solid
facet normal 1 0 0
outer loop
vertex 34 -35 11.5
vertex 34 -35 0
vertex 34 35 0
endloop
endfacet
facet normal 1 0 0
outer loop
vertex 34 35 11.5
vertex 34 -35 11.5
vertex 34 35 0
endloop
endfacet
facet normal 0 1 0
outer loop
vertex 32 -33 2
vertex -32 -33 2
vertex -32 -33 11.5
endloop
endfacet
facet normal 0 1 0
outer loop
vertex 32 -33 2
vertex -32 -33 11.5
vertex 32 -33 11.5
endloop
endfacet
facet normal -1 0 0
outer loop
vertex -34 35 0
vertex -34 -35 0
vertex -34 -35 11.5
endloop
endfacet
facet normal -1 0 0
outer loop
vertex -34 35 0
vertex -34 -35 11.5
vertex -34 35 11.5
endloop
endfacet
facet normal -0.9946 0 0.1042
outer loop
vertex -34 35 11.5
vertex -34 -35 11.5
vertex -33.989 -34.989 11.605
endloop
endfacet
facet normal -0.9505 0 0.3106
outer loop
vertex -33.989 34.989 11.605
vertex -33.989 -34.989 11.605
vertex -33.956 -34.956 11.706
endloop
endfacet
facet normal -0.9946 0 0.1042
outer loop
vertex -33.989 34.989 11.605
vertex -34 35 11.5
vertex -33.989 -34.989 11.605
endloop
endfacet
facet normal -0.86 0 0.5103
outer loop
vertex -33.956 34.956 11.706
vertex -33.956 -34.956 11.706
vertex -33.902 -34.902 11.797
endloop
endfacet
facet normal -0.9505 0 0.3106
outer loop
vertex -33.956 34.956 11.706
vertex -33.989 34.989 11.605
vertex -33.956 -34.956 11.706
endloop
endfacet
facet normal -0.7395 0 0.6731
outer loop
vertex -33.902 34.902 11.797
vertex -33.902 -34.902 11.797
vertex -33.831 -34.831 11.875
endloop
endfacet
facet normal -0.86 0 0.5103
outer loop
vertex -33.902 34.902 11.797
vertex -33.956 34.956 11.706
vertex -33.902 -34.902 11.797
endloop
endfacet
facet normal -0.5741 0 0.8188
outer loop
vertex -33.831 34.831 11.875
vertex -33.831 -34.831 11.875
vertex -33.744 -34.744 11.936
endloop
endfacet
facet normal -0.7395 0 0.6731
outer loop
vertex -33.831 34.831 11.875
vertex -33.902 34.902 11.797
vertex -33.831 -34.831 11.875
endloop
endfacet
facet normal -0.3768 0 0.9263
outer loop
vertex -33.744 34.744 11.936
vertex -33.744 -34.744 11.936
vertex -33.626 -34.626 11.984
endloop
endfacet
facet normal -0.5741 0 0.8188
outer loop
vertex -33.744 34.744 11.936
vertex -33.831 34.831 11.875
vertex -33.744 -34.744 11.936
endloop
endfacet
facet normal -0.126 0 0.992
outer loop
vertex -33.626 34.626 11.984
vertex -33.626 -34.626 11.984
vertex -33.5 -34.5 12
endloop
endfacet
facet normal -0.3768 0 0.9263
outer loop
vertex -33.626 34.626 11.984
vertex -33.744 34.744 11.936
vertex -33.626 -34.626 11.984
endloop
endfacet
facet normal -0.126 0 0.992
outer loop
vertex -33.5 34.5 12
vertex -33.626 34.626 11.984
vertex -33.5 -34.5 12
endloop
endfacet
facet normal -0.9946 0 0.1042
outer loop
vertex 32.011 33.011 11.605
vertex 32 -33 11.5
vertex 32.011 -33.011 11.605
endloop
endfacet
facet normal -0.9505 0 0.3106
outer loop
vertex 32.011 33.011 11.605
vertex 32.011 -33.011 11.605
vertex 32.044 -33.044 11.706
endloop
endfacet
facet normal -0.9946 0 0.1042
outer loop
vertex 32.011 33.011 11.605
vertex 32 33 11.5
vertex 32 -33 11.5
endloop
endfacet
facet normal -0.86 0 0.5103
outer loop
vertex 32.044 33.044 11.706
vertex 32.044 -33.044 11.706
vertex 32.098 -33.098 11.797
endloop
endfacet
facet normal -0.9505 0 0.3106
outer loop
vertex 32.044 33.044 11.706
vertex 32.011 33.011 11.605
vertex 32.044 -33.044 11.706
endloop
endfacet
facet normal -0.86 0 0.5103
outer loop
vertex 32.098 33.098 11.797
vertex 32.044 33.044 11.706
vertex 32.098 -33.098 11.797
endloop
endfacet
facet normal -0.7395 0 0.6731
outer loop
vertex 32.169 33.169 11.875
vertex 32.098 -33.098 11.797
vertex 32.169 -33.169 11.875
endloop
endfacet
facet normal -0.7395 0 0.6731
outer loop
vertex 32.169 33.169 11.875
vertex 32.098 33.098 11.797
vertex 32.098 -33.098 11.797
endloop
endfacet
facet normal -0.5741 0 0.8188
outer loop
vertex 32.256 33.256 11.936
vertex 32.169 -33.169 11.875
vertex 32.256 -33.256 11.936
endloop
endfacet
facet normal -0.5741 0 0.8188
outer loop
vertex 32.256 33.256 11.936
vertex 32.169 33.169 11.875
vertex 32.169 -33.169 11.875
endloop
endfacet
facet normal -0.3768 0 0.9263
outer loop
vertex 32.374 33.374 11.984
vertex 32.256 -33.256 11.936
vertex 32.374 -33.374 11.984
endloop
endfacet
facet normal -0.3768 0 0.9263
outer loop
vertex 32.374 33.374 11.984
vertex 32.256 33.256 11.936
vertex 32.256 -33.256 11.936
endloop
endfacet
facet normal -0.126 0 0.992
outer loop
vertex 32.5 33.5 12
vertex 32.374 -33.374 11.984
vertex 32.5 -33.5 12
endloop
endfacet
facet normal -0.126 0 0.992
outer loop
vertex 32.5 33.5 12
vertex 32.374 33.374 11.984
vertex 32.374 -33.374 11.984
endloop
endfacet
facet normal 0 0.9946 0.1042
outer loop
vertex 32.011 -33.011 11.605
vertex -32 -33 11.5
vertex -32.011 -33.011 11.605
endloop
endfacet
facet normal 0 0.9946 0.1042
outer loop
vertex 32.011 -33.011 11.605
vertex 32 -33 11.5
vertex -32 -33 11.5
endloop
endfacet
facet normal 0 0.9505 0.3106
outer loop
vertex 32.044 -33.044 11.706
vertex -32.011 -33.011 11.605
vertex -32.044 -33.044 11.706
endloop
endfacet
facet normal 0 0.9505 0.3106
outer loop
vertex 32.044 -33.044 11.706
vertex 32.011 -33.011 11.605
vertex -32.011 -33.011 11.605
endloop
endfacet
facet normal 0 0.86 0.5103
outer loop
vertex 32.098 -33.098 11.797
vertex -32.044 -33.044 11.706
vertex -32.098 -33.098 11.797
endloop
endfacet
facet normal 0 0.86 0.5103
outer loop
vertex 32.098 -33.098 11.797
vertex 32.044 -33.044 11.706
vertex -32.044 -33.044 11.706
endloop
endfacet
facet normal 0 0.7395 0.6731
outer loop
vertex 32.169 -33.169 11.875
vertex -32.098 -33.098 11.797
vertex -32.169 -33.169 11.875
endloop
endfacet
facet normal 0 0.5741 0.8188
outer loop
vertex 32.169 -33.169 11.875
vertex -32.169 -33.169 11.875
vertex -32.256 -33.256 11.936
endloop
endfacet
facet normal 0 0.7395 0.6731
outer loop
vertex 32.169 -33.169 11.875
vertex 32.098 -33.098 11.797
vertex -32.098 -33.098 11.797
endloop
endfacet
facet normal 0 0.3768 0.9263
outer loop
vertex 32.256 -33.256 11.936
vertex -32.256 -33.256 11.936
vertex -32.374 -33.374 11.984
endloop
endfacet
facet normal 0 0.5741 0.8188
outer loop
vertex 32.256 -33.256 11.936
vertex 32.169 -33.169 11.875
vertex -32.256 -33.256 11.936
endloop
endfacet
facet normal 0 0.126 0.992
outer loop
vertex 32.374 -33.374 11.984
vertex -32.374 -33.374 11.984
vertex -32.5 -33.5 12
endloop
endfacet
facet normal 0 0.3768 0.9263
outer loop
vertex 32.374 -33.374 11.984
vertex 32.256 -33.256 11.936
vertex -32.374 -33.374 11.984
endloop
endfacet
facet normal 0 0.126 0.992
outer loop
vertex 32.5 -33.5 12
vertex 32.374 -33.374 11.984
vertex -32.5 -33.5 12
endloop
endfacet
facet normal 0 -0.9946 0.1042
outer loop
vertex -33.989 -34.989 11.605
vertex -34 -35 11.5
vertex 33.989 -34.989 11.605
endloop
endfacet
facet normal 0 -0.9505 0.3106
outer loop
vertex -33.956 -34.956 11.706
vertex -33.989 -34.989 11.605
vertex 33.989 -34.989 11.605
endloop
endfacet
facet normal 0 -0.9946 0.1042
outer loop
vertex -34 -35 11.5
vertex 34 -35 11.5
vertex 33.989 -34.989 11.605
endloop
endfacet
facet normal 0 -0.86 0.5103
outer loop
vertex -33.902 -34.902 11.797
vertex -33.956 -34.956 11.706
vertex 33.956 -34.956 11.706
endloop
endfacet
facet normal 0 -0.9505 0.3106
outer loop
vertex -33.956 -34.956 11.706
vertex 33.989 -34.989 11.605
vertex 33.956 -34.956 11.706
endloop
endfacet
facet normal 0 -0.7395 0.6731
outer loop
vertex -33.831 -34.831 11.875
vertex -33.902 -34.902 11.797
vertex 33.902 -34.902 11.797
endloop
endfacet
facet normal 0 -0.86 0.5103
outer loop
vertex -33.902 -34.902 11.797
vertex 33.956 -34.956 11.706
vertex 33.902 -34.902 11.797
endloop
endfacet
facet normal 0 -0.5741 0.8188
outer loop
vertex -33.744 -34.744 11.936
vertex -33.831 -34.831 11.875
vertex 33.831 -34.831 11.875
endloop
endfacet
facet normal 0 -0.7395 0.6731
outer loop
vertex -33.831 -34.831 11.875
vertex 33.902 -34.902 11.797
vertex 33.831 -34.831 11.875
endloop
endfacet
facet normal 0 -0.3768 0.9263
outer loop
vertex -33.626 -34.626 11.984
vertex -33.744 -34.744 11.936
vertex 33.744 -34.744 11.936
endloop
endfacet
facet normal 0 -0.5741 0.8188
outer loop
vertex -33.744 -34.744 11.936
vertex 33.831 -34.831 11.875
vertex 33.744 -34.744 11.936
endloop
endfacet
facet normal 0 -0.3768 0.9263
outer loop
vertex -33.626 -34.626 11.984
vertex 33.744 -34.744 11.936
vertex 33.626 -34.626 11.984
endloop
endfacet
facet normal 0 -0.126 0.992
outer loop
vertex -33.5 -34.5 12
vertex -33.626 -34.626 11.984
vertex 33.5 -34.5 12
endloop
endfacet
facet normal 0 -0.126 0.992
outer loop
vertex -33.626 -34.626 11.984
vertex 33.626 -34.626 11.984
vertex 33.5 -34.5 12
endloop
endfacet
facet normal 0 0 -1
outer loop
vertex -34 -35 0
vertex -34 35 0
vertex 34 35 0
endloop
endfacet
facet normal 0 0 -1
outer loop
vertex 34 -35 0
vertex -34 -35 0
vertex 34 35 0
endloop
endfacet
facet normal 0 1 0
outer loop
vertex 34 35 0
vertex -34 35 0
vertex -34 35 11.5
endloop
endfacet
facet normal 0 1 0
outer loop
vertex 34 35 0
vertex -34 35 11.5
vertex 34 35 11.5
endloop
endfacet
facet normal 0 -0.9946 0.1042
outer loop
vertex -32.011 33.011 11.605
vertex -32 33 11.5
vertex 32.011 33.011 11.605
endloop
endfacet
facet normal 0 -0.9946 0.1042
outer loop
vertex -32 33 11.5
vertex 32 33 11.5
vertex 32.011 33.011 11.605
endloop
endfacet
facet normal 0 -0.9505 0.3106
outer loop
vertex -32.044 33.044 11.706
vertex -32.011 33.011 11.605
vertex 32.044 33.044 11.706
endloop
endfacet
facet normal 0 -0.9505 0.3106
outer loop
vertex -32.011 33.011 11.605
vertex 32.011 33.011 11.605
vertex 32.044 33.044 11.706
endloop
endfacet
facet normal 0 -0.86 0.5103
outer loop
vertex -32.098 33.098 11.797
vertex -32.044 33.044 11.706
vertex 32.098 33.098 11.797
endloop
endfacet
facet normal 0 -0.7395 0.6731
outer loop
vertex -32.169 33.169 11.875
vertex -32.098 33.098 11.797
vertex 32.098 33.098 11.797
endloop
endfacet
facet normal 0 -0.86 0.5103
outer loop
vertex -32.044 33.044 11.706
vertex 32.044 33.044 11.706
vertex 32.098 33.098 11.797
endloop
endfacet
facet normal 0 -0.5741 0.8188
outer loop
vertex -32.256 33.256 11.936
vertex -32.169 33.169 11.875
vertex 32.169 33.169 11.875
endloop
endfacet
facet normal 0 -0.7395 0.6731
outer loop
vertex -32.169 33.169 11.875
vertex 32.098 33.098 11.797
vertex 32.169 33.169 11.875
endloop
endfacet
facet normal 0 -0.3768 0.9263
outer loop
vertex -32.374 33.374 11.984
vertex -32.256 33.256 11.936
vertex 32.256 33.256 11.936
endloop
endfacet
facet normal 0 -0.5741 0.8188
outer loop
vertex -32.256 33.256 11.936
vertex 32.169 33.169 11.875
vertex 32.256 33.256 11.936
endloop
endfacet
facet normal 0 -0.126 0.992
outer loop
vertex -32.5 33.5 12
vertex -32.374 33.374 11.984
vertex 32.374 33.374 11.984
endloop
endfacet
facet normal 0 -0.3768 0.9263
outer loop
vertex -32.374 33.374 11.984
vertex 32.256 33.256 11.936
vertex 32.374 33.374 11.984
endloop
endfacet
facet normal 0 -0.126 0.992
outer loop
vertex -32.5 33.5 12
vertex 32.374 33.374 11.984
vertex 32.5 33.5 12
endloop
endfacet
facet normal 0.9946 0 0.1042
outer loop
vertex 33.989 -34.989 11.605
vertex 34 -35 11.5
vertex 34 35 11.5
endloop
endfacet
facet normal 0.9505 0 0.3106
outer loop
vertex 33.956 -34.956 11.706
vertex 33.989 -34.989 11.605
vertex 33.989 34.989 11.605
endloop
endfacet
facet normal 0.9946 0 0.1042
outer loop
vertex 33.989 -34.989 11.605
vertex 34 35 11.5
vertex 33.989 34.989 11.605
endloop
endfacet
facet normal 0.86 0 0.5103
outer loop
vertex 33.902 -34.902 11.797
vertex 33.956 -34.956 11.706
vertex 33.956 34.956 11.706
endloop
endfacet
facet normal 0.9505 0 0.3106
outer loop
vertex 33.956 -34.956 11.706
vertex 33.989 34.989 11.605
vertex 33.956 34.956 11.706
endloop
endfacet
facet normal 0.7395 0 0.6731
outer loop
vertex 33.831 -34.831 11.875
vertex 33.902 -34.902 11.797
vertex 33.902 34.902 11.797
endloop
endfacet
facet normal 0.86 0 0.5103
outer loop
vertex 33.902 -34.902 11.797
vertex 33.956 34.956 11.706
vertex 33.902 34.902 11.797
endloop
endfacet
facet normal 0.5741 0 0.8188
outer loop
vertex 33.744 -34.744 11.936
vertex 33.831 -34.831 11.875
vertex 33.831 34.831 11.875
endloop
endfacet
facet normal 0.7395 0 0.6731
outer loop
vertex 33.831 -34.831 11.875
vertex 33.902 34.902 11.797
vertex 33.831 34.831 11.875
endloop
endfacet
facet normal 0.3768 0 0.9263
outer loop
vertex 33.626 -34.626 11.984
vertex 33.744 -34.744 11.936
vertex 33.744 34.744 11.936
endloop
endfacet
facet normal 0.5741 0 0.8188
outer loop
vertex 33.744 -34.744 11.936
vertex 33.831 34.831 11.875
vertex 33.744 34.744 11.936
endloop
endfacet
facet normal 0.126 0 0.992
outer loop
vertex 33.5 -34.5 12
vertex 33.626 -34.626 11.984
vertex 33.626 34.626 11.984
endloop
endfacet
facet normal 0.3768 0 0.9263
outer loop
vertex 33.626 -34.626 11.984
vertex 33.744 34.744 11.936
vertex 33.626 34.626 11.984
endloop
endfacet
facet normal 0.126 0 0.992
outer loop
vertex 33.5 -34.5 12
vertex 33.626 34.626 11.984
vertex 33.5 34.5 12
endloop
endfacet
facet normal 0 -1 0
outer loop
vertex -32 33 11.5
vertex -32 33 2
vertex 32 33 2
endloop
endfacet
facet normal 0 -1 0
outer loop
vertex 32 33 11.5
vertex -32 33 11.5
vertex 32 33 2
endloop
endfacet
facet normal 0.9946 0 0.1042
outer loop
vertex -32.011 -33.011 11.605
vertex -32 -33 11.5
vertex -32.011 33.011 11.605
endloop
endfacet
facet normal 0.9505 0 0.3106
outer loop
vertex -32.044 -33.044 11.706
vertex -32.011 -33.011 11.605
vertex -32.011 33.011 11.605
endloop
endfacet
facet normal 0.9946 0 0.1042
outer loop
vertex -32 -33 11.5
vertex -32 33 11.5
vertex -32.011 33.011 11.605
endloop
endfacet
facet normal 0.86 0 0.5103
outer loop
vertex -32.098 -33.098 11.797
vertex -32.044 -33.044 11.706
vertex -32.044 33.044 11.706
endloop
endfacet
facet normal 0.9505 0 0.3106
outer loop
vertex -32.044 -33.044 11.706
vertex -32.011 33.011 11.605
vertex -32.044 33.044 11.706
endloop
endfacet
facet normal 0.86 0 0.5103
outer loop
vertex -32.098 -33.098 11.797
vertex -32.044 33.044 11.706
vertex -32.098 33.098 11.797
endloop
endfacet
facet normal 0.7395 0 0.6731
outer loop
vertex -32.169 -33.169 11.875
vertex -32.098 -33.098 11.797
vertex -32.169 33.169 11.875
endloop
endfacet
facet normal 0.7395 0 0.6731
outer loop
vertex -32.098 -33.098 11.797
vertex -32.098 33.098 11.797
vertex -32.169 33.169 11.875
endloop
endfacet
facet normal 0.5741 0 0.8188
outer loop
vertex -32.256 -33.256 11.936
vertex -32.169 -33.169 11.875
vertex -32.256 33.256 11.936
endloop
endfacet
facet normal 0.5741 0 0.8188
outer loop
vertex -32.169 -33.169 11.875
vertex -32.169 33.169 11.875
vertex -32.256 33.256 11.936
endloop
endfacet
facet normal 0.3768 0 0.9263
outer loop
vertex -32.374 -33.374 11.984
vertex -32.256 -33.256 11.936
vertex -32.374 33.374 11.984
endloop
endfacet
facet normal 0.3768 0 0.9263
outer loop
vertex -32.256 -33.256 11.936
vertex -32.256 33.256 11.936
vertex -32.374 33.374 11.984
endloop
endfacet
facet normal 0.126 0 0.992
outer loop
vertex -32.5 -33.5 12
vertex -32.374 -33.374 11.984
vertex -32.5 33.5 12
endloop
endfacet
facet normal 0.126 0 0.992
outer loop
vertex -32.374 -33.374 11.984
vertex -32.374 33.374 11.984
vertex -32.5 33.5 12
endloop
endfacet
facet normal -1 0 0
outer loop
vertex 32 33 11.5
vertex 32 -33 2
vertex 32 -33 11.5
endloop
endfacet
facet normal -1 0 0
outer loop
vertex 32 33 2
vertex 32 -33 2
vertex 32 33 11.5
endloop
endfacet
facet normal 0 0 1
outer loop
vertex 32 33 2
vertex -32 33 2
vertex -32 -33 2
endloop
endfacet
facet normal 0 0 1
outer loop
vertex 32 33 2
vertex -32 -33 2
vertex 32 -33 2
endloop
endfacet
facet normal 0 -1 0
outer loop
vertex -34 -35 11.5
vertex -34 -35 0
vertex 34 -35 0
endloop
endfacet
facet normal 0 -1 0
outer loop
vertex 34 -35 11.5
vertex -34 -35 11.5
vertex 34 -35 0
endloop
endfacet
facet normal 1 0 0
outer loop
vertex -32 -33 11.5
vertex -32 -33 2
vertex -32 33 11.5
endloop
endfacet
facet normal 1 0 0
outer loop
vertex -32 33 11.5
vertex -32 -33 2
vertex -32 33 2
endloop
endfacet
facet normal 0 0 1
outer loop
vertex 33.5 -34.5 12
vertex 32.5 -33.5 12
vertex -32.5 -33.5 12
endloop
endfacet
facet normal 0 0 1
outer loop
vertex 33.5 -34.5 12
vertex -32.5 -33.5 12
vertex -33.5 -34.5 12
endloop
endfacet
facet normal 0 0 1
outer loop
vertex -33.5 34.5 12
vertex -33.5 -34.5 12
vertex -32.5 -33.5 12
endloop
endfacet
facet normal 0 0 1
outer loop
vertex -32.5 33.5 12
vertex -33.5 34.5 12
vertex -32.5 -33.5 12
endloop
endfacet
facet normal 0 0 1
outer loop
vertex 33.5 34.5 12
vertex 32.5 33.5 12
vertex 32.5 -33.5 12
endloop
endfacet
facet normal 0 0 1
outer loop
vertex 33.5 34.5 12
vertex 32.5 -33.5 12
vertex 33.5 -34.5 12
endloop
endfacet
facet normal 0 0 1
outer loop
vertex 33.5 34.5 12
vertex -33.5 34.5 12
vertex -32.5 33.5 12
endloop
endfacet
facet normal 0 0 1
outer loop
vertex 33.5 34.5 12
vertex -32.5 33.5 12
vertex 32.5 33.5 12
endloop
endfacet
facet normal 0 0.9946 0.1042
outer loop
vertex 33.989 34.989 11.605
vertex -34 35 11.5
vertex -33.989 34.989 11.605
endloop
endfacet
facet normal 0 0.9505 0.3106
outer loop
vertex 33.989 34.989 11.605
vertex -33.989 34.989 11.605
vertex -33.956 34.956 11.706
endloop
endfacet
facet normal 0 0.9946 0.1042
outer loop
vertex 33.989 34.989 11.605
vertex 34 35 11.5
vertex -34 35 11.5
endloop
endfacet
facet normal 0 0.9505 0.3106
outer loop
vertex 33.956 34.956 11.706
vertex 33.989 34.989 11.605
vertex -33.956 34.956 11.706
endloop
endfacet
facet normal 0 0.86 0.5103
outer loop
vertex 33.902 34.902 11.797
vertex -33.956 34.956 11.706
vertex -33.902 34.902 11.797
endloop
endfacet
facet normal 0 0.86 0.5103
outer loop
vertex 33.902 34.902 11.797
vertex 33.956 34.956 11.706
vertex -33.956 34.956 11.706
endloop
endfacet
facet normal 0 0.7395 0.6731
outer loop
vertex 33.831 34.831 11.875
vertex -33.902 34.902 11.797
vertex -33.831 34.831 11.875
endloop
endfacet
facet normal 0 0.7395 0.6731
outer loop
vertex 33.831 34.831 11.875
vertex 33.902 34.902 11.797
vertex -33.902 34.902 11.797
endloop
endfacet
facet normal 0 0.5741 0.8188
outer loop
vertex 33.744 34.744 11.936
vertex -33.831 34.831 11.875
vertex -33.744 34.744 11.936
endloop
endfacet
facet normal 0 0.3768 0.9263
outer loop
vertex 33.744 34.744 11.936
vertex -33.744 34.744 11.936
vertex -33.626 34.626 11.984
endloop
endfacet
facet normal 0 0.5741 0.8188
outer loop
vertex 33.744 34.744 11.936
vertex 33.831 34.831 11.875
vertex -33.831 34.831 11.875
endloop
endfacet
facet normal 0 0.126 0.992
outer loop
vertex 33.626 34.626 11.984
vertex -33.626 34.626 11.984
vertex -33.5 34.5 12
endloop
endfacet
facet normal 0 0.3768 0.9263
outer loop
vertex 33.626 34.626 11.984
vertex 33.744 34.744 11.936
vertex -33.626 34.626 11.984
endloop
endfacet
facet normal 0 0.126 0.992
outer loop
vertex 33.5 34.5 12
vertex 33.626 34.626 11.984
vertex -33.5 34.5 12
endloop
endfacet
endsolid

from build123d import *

# Parameters (mm, degrees)
F0_W     = 68
F0_H     = 70
F0_W_2   = 64
F0_H_2   = 66
F1_DEPTH = 12
F2_R     = 0.5
F3_W     = 64
F3_H     = 2
F4_DEPTH = 66


with BuildPart() as f1:
    # F0 (on Top) → F1 (new body)
    with BuildSketch(Plane.XY):
        Rectangle(F0_W, F0_H)
        Rectangle(F0_W_2, F0_H_2, mode=Mode.SUBTRACT)
    extrude(amount=F1_DEPTH)

    # F2
    f2_edges = [f1.edges().sort_by_distance(p)[0] for p in [
        (-34, 0, 12),
        (0, -35, 12),
        (0, 35, 12),
        (34, 0, 12),
        (-32, 0, 12),
        (0, 33, 12),
        (32, 0, 12),
        (0, -33, 12),
    ]]
    fillet(f2_edges, radius=F2_R)

    # F3 (on face) → F4 (join, through all)
    with BuildSketch(Plane.XZ.offset(-33)):
        with Locations((0, 1)):
            Rectangle(F3_W, F3_H)
    extrude(amount=F4_DEPTH)


solid = f1.part
